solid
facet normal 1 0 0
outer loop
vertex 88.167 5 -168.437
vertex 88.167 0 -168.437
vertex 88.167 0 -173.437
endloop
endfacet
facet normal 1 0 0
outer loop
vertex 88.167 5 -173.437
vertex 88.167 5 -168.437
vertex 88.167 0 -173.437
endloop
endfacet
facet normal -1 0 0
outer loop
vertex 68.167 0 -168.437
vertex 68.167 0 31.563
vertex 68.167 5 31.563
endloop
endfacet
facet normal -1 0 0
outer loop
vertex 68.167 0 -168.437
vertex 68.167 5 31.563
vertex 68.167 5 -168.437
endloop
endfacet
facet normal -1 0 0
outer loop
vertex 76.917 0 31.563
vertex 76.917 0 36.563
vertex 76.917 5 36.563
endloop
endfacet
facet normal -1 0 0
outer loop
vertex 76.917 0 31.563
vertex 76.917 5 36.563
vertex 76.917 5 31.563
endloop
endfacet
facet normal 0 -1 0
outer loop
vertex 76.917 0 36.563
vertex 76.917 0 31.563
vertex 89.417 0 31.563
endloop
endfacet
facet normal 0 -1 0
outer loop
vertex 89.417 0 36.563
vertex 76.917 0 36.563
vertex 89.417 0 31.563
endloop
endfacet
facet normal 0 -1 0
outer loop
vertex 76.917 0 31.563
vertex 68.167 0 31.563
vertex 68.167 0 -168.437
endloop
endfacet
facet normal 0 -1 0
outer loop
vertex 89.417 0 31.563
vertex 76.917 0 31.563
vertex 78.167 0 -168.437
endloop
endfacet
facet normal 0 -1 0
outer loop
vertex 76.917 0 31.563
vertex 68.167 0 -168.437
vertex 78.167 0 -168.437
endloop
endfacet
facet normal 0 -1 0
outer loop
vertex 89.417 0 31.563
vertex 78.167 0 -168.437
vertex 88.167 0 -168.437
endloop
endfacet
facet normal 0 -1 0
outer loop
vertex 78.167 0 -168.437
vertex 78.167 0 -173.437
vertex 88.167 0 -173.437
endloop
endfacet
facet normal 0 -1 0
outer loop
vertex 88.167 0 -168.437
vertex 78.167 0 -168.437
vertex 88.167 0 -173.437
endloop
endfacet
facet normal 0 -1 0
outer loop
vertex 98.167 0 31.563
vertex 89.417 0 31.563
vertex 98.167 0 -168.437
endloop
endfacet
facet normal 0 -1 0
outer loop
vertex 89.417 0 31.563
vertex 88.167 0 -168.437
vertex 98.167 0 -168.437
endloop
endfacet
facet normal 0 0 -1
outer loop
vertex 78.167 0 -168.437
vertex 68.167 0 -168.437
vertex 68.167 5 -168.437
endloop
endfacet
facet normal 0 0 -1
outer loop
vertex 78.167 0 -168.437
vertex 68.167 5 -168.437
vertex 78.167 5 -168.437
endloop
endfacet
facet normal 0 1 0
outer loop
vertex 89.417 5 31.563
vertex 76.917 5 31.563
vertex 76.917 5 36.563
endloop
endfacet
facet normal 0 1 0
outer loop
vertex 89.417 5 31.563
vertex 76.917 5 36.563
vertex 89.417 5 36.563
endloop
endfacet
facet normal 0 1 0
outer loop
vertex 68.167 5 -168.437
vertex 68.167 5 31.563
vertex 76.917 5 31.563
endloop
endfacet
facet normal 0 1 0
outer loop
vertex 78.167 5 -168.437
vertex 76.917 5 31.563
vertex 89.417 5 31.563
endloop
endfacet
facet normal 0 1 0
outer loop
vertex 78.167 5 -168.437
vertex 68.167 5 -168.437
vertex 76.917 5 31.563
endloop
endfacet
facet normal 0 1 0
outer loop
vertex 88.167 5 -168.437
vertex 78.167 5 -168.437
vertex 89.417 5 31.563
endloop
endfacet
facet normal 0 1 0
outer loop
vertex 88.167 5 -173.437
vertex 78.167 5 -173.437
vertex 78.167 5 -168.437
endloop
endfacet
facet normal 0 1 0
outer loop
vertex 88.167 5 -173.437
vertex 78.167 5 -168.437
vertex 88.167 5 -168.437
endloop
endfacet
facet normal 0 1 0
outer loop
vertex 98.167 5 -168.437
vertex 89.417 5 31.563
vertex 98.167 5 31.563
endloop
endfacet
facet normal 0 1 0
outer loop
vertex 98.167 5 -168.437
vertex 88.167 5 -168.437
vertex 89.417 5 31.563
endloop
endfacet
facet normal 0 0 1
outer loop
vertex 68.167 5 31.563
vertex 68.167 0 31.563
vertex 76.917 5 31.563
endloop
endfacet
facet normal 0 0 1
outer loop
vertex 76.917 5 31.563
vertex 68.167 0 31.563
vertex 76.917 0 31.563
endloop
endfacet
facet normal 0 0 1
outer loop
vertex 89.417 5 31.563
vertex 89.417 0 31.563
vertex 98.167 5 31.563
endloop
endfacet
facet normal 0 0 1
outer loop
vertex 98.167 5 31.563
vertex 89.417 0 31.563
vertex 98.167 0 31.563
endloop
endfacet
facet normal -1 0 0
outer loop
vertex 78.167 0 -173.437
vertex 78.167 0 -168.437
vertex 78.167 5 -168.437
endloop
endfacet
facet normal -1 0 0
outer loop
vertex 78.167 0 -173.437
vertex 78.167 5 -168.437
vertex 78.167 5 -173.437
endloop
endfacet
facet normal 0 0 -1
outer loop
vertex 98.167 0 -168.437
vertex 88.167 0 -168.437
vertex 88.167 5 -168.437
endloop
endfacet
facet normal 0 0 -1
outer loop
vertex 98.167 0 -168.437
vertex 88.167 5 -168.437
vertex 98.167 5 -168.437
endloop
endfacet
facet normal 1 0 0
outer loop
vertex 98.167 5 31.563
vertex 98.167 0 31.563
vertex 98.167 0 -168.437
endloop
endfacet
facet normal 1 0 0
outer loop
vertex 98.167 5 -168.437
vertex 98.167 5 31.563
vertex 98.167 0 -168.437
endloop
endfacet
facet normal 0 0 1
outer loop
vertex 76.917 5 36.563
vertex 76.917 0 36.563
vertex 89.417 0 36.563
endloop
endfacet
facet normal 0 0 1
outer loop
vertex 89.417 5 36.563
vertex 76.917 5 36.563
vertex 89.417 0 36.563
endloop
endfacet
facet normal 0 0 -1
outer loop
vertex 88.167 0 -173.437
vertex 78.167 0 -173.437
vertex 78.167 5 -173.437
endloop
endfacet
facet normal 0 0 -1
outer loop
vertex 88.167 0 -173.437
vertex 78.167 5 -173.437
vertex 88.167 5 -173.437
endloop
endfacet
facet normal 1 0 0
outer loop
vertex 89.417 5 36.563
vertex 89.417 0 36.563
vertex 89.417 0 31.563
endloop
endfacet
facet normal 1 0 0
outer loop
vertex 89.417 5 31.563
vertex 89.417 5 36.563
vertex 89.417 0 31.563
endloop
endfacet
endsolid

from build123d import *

# Parameters (mm, degrees)
SKETCH1_W           = 12.5
SKETCH1_H           = 10
SKETCH1_W_2         = 30
SKETCH1_H_2         = 200
SKETCH1_W_3         = 10
BOSS_EXTRUDE1_DEPTH = 5


with BuildPart() as part:
    # Sketch1 → Boss-Extrude1 (new body)
    with BuildSketch(Plane(origin=(0, 0, 0), x_dir=(1, 0, 0), z_dir=(0, 1, 0))):
        with Locations((83.16678375, -31.56250034)):
            Rectangle(SKETCH1_W, SKETCH1_H)
        with Locations((83.16678375, 68.43749966)):
            Rectangle(SKETCH1_W_2, SKETCH1_H_2)
        with Locations((83.16678375, 168.43749966)):
            Rectangle(SKETCH1_W_3, SKETCH1_H)
    extrude(amount=BOSS_EXTRUDE1_DEPTH)


solid = part.part
